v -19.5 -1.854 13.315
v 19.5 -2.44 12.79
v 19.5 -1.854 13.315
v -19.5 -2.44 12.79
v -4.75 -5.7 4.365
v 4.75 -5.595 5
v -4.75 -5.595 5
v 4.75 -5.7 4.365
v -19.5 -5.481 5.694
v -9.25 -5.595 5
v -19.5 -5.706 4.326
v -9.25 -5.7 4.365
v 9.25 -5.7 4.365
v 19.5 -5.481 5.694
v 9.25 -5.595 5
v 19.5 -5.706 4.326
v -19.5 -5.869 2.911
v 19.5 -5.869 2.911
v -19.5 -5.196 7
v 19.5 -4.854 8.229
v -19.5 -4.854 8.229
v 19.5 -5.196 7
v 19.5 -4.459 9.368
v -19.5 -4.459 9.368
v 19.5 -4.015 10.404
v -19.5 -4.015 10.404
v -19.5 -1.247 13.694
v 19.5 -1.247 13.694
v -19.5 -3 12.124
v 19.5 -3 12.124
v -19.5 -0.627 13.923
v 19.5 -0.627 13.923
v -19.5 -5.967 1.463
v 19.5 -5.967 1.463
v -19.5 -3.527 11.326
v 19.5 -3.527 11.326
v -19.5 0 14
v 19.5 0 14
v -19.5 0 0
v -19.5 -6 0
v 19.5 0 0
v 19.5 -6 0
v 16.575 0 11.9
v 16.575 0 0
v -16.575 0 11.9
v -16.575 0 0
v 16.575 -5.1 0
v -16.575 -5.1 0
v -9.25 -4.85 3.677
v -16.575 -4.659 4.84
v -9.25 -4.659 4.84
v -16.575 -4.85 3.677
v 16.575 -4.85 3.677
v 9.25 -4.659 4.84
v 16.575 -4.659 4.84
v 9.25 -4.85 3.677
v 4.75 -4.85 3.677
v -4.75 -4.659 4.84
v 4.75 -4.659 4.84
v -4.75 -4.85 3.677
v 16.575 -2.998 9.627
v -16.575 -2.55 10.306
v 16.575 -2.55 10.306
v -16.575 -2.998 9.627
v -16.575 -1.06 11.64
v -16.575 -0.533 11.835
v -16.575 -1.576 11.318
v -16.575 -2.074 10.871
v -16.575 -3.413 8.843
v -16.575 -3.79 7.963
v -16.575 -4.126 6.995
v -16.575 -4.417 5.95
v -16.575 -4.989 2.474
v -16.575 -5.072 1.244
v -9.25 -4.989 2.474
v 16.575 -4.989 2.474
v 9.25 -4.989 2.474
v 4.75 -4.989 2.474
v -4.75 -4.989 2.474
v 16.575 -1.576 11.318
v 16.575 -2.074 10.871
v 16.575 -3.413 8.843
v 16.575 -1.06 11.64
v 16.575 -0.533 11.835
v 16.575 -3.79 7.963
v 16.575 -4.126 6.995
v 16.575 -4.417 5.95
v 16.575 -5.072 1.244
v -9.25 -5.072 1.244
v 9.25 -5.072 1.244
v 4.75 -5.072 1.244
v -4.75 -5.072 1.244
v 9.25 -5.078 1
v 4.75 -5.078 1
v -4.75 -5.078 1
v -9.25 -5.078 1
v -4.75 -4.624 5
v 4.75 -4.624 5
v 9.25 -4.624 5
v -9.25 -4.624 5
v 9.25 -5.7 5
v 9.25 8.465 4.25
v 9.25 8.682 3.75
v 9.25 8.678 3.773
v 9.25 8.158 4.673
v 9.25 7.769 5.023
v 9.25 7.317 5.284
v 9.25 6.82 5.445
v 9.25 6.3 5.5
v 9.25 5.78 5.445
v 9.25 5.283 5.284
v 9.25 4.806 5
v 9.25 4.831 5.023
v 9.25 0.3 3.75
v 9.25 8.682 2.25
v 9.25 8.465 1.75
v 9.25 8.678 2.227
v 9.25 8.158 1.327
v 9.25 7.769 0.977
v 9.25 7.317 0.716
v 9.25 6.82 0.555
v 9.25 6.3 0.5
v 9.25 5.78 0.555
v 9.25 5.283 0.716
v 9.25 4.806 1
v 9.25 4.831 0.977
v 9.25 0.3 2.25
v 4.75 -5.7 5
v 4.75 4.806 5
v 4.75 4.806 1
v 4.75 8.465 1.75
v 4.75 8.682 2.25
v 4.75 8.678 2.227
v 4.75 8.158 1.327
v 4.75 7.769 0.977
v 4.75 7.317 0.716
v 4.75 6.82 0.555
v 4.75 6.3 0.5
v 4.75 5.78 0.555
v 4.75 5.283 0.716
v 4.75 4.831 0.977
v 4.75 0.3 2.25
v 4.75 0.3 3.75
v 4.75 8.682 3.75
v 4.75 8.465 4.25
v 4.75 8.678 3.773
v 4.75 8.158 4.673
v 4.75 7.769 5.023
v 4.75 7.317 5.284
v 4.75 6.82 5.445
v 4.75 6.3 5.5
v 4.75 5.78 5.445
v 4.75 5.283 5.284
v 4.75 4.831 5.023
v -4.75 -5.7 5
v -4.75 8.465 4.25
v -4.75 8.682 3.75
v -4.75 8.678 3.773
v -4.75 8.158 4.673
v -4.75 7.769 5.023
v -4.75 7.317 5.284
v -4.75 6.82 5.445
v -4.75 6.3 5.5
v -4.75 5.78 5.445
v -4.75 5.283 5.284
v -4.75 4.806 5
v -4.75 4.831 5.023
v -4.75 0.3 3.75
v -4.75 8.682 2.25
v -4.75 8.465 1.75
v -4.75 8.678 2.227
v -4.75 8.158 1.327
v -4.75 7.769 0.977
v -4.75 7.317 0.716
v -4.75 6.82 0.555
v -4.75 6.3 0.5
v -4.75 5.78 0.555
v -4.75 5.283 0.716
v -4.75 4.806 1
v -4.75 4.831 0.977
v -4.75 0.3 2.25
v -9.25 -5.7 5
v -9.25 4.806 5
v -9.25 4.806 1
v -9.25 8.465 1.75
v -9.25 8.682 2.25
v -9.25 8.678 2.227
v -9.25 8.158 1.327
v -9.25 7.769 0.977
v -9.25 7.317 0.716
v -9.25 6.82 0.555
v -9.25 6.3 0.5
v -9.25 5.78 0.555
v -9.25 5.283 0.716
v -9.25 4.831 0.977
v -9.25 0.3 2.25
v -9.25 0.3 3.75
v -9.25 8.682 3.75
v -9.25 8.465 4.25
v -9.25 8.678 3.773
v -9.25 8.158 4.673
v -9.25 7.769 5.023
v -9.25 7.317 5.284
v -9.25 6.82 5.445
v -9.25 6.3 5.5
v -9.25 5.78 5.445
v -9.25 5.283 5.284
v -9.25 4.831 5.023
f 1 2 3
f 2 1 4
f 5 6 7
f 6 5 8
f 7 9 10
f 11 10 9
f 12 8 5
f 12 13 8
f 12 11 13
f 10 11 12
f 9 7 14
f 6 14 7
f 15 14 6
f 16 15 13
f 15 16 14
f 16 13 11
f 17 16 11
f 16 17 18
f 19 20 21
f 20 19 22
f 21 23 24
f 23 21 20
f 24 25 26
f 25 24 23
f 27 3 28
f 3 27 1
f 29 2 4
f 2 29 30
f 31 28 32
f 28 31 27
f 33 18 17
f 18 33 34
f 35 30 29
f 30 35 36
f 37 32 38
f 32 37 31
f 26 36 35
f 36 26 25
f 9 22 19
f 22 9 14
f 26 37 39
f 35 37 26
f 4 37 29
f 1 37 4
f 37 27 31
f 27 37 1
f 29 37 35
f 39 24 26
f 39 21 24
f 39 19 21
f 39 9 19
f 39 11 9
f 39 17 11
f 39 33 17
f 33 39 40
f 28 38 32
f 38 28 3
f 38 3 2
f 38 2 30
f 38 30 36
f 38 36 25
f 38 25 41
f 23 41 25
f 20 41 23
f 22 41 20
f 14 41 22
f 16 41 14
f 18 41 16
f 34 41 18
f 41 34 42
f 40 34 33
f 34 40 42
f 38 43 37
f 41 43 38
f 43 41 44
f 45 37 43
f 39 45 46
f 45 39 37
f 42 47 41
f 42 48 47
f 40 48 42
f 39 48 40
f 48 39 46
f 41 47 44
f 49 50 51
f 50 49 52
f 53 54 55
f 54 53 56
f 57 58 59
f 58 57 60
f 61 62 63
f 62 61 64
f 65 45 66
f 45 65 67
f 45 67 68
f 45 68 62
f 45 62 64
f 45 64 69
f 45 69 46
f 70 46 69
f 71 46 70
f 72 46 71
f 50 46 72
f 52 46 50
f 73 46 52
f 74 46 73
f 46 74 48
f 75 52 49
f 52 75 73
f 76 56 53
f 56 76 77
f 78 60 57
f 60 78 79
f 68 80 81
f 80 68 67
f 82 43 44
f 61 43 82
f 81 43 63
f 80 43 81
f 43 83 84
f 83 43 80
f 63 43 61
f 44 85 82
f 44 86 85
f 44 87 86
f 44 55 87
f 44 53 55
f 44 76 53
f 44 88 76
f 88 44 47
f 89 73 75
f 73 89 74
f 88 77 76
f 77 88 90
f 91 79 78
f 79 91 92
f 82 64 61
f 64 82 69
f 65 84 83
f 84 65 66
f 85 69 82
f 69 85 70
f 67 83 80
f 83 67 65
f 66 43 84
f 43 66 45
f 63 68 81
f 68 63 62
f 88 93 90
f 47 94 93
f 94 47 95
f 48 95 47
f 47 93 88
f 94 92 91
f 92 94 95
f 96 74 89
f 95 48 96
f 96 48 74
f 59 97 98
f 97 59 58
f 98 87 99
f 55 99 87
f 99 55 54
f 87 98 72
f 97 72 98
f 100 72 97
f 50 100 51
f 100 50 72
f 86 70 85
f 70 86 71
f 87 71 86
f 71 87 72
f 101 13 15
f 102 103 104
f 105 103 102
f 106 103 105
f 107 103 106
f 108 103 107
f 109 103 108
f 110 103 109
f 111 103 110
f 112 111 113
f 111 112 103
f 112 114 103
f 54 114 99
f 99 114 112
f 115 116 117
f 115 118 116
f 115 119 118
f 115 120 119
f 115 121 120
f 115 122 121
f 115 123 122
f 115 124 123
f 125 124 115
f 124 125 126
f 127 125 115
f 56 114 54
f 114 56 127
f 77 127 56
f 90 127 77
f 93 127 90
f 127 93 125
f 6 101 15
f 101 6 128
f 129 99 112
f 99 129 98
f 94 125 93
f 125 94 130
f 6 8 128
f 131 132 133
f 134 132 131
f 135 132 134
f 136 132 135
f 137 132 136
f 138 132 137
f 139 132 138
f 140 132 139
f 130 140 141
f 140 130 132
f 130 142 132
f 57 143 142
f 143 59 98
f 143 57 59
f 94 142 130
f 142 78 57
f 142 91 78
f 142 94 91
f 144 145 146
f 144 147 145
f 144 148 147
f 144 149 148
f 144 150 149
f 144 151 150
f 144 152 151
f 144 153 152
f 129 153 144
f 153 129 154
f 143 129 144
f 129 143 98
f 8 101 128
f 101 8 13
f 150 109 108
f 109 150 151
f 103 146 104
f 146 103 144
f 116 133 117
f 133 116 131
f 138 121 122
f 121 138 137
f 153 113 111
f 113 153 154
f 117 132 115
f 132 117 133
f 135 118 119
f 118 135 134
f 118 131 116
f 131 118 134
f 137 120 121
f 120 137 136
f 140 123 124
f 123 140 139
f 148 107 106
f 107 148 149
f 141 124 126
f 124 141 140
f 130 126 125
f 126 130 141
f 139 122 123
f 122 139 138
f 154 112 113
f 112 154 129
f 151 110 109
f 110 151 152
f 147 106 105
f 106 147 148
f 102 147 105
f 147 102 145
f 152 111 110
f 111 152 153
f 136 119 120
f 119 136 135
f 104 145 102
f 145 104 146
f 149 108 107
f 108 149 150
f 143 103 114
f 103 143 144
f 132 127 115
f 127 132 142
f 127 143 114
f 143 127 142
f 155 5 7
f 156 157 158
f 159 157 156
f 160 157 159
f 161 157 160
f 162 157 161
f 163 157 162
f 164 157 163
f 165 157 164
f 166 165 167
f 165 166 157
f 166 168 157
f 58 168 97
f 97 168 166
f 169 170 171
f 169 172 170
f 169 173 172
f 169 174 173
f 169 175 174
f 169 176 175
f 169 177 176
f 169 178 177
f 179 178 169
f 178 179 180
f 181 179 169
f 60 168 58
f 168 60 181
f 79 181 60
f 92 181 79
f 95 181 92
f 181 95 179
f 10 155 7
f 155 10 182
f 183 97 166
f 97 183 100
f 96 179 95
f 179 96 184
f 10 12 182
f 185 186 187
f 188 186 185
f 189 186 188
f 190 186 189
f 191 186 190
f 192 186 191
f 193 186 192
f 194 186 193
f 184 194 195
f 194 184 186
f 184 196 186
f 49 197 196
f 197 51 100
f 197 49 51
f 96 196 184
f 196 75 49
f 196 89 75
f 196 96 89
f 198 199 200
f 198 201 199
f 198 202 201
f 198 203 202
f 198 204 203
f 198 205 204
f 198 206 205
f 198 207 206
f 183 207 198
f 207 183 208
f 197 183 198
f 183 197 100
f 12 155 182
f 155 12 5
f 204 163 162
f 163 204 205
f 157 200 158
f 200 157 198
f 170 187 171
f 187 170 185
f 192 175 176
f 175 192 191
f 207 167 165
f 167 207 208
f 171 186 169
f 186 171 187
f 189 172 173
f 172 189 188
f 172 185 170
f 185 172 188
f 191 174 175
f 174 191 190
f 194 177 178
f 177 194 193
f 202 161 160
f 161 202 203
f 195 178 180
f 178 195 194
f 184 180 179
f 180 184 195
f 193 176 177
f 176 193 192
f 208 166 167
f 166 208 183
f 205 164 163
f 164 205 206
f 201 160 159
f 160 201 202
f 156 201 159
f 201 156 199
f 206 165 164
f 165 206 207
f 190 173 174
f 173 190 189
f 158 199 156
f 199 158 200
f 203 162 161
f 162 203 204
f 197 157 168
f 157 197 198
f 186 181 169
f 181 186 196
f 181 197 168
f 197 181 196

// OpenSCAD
include<lib.scad>


hole_w=33;
hole_h=4;

mask_border=2;
mask_w=39;
mask_d=6;
mask_h=14;

pin_w=4.5;
pin_h=4;
pin_d=12;
pin_gap=1.5;

difference() {
scale([1, mask_d/mask_h, 1])
rotate([0,90,0])
    cylinder(h=mask_w, r=mask_h, center=true, $fn=60);
translate([0, mask_d*1.05, 0])
    cube([mask_w*1.05, mask_d*2.1, mask_h*2.1], center=true);
translate([0, 0, -mask_h*1.05])
    cube([mask_w*1.05, mask_d*2.1, mask_h*2.1], center=true);
scale([0.85, 0.85*mask_d/mask_h, 0.85])
rotate([0,90,0])
    cylinder(h=mask_w, r=mask_h, center=true, $fn=60);
}


module pin_clip(w,d,h,g,c) {
    difference() {
        union() {
            cube([w, d, h]);
                translate([0,d,h/2])
                rotate([0,90,0])
                    cylinder(d=h+c, h=w, $fn=30);
        }
        translate([-w*0.025,d/2,(h-g)/2])
            cube([w*1.05, d, g]);
    }
}

translate([ -pin_w/2+7, -mask_d*0.95, 1])
    pin_clip(pin_w, pin_d, pin_h, pin_gap, 1);

translate([ -pin_w/2-7, -mask_d*0.95, 1])
    pin_clip(pin_w, pin_d, pin_h, pin_gap, 1);
